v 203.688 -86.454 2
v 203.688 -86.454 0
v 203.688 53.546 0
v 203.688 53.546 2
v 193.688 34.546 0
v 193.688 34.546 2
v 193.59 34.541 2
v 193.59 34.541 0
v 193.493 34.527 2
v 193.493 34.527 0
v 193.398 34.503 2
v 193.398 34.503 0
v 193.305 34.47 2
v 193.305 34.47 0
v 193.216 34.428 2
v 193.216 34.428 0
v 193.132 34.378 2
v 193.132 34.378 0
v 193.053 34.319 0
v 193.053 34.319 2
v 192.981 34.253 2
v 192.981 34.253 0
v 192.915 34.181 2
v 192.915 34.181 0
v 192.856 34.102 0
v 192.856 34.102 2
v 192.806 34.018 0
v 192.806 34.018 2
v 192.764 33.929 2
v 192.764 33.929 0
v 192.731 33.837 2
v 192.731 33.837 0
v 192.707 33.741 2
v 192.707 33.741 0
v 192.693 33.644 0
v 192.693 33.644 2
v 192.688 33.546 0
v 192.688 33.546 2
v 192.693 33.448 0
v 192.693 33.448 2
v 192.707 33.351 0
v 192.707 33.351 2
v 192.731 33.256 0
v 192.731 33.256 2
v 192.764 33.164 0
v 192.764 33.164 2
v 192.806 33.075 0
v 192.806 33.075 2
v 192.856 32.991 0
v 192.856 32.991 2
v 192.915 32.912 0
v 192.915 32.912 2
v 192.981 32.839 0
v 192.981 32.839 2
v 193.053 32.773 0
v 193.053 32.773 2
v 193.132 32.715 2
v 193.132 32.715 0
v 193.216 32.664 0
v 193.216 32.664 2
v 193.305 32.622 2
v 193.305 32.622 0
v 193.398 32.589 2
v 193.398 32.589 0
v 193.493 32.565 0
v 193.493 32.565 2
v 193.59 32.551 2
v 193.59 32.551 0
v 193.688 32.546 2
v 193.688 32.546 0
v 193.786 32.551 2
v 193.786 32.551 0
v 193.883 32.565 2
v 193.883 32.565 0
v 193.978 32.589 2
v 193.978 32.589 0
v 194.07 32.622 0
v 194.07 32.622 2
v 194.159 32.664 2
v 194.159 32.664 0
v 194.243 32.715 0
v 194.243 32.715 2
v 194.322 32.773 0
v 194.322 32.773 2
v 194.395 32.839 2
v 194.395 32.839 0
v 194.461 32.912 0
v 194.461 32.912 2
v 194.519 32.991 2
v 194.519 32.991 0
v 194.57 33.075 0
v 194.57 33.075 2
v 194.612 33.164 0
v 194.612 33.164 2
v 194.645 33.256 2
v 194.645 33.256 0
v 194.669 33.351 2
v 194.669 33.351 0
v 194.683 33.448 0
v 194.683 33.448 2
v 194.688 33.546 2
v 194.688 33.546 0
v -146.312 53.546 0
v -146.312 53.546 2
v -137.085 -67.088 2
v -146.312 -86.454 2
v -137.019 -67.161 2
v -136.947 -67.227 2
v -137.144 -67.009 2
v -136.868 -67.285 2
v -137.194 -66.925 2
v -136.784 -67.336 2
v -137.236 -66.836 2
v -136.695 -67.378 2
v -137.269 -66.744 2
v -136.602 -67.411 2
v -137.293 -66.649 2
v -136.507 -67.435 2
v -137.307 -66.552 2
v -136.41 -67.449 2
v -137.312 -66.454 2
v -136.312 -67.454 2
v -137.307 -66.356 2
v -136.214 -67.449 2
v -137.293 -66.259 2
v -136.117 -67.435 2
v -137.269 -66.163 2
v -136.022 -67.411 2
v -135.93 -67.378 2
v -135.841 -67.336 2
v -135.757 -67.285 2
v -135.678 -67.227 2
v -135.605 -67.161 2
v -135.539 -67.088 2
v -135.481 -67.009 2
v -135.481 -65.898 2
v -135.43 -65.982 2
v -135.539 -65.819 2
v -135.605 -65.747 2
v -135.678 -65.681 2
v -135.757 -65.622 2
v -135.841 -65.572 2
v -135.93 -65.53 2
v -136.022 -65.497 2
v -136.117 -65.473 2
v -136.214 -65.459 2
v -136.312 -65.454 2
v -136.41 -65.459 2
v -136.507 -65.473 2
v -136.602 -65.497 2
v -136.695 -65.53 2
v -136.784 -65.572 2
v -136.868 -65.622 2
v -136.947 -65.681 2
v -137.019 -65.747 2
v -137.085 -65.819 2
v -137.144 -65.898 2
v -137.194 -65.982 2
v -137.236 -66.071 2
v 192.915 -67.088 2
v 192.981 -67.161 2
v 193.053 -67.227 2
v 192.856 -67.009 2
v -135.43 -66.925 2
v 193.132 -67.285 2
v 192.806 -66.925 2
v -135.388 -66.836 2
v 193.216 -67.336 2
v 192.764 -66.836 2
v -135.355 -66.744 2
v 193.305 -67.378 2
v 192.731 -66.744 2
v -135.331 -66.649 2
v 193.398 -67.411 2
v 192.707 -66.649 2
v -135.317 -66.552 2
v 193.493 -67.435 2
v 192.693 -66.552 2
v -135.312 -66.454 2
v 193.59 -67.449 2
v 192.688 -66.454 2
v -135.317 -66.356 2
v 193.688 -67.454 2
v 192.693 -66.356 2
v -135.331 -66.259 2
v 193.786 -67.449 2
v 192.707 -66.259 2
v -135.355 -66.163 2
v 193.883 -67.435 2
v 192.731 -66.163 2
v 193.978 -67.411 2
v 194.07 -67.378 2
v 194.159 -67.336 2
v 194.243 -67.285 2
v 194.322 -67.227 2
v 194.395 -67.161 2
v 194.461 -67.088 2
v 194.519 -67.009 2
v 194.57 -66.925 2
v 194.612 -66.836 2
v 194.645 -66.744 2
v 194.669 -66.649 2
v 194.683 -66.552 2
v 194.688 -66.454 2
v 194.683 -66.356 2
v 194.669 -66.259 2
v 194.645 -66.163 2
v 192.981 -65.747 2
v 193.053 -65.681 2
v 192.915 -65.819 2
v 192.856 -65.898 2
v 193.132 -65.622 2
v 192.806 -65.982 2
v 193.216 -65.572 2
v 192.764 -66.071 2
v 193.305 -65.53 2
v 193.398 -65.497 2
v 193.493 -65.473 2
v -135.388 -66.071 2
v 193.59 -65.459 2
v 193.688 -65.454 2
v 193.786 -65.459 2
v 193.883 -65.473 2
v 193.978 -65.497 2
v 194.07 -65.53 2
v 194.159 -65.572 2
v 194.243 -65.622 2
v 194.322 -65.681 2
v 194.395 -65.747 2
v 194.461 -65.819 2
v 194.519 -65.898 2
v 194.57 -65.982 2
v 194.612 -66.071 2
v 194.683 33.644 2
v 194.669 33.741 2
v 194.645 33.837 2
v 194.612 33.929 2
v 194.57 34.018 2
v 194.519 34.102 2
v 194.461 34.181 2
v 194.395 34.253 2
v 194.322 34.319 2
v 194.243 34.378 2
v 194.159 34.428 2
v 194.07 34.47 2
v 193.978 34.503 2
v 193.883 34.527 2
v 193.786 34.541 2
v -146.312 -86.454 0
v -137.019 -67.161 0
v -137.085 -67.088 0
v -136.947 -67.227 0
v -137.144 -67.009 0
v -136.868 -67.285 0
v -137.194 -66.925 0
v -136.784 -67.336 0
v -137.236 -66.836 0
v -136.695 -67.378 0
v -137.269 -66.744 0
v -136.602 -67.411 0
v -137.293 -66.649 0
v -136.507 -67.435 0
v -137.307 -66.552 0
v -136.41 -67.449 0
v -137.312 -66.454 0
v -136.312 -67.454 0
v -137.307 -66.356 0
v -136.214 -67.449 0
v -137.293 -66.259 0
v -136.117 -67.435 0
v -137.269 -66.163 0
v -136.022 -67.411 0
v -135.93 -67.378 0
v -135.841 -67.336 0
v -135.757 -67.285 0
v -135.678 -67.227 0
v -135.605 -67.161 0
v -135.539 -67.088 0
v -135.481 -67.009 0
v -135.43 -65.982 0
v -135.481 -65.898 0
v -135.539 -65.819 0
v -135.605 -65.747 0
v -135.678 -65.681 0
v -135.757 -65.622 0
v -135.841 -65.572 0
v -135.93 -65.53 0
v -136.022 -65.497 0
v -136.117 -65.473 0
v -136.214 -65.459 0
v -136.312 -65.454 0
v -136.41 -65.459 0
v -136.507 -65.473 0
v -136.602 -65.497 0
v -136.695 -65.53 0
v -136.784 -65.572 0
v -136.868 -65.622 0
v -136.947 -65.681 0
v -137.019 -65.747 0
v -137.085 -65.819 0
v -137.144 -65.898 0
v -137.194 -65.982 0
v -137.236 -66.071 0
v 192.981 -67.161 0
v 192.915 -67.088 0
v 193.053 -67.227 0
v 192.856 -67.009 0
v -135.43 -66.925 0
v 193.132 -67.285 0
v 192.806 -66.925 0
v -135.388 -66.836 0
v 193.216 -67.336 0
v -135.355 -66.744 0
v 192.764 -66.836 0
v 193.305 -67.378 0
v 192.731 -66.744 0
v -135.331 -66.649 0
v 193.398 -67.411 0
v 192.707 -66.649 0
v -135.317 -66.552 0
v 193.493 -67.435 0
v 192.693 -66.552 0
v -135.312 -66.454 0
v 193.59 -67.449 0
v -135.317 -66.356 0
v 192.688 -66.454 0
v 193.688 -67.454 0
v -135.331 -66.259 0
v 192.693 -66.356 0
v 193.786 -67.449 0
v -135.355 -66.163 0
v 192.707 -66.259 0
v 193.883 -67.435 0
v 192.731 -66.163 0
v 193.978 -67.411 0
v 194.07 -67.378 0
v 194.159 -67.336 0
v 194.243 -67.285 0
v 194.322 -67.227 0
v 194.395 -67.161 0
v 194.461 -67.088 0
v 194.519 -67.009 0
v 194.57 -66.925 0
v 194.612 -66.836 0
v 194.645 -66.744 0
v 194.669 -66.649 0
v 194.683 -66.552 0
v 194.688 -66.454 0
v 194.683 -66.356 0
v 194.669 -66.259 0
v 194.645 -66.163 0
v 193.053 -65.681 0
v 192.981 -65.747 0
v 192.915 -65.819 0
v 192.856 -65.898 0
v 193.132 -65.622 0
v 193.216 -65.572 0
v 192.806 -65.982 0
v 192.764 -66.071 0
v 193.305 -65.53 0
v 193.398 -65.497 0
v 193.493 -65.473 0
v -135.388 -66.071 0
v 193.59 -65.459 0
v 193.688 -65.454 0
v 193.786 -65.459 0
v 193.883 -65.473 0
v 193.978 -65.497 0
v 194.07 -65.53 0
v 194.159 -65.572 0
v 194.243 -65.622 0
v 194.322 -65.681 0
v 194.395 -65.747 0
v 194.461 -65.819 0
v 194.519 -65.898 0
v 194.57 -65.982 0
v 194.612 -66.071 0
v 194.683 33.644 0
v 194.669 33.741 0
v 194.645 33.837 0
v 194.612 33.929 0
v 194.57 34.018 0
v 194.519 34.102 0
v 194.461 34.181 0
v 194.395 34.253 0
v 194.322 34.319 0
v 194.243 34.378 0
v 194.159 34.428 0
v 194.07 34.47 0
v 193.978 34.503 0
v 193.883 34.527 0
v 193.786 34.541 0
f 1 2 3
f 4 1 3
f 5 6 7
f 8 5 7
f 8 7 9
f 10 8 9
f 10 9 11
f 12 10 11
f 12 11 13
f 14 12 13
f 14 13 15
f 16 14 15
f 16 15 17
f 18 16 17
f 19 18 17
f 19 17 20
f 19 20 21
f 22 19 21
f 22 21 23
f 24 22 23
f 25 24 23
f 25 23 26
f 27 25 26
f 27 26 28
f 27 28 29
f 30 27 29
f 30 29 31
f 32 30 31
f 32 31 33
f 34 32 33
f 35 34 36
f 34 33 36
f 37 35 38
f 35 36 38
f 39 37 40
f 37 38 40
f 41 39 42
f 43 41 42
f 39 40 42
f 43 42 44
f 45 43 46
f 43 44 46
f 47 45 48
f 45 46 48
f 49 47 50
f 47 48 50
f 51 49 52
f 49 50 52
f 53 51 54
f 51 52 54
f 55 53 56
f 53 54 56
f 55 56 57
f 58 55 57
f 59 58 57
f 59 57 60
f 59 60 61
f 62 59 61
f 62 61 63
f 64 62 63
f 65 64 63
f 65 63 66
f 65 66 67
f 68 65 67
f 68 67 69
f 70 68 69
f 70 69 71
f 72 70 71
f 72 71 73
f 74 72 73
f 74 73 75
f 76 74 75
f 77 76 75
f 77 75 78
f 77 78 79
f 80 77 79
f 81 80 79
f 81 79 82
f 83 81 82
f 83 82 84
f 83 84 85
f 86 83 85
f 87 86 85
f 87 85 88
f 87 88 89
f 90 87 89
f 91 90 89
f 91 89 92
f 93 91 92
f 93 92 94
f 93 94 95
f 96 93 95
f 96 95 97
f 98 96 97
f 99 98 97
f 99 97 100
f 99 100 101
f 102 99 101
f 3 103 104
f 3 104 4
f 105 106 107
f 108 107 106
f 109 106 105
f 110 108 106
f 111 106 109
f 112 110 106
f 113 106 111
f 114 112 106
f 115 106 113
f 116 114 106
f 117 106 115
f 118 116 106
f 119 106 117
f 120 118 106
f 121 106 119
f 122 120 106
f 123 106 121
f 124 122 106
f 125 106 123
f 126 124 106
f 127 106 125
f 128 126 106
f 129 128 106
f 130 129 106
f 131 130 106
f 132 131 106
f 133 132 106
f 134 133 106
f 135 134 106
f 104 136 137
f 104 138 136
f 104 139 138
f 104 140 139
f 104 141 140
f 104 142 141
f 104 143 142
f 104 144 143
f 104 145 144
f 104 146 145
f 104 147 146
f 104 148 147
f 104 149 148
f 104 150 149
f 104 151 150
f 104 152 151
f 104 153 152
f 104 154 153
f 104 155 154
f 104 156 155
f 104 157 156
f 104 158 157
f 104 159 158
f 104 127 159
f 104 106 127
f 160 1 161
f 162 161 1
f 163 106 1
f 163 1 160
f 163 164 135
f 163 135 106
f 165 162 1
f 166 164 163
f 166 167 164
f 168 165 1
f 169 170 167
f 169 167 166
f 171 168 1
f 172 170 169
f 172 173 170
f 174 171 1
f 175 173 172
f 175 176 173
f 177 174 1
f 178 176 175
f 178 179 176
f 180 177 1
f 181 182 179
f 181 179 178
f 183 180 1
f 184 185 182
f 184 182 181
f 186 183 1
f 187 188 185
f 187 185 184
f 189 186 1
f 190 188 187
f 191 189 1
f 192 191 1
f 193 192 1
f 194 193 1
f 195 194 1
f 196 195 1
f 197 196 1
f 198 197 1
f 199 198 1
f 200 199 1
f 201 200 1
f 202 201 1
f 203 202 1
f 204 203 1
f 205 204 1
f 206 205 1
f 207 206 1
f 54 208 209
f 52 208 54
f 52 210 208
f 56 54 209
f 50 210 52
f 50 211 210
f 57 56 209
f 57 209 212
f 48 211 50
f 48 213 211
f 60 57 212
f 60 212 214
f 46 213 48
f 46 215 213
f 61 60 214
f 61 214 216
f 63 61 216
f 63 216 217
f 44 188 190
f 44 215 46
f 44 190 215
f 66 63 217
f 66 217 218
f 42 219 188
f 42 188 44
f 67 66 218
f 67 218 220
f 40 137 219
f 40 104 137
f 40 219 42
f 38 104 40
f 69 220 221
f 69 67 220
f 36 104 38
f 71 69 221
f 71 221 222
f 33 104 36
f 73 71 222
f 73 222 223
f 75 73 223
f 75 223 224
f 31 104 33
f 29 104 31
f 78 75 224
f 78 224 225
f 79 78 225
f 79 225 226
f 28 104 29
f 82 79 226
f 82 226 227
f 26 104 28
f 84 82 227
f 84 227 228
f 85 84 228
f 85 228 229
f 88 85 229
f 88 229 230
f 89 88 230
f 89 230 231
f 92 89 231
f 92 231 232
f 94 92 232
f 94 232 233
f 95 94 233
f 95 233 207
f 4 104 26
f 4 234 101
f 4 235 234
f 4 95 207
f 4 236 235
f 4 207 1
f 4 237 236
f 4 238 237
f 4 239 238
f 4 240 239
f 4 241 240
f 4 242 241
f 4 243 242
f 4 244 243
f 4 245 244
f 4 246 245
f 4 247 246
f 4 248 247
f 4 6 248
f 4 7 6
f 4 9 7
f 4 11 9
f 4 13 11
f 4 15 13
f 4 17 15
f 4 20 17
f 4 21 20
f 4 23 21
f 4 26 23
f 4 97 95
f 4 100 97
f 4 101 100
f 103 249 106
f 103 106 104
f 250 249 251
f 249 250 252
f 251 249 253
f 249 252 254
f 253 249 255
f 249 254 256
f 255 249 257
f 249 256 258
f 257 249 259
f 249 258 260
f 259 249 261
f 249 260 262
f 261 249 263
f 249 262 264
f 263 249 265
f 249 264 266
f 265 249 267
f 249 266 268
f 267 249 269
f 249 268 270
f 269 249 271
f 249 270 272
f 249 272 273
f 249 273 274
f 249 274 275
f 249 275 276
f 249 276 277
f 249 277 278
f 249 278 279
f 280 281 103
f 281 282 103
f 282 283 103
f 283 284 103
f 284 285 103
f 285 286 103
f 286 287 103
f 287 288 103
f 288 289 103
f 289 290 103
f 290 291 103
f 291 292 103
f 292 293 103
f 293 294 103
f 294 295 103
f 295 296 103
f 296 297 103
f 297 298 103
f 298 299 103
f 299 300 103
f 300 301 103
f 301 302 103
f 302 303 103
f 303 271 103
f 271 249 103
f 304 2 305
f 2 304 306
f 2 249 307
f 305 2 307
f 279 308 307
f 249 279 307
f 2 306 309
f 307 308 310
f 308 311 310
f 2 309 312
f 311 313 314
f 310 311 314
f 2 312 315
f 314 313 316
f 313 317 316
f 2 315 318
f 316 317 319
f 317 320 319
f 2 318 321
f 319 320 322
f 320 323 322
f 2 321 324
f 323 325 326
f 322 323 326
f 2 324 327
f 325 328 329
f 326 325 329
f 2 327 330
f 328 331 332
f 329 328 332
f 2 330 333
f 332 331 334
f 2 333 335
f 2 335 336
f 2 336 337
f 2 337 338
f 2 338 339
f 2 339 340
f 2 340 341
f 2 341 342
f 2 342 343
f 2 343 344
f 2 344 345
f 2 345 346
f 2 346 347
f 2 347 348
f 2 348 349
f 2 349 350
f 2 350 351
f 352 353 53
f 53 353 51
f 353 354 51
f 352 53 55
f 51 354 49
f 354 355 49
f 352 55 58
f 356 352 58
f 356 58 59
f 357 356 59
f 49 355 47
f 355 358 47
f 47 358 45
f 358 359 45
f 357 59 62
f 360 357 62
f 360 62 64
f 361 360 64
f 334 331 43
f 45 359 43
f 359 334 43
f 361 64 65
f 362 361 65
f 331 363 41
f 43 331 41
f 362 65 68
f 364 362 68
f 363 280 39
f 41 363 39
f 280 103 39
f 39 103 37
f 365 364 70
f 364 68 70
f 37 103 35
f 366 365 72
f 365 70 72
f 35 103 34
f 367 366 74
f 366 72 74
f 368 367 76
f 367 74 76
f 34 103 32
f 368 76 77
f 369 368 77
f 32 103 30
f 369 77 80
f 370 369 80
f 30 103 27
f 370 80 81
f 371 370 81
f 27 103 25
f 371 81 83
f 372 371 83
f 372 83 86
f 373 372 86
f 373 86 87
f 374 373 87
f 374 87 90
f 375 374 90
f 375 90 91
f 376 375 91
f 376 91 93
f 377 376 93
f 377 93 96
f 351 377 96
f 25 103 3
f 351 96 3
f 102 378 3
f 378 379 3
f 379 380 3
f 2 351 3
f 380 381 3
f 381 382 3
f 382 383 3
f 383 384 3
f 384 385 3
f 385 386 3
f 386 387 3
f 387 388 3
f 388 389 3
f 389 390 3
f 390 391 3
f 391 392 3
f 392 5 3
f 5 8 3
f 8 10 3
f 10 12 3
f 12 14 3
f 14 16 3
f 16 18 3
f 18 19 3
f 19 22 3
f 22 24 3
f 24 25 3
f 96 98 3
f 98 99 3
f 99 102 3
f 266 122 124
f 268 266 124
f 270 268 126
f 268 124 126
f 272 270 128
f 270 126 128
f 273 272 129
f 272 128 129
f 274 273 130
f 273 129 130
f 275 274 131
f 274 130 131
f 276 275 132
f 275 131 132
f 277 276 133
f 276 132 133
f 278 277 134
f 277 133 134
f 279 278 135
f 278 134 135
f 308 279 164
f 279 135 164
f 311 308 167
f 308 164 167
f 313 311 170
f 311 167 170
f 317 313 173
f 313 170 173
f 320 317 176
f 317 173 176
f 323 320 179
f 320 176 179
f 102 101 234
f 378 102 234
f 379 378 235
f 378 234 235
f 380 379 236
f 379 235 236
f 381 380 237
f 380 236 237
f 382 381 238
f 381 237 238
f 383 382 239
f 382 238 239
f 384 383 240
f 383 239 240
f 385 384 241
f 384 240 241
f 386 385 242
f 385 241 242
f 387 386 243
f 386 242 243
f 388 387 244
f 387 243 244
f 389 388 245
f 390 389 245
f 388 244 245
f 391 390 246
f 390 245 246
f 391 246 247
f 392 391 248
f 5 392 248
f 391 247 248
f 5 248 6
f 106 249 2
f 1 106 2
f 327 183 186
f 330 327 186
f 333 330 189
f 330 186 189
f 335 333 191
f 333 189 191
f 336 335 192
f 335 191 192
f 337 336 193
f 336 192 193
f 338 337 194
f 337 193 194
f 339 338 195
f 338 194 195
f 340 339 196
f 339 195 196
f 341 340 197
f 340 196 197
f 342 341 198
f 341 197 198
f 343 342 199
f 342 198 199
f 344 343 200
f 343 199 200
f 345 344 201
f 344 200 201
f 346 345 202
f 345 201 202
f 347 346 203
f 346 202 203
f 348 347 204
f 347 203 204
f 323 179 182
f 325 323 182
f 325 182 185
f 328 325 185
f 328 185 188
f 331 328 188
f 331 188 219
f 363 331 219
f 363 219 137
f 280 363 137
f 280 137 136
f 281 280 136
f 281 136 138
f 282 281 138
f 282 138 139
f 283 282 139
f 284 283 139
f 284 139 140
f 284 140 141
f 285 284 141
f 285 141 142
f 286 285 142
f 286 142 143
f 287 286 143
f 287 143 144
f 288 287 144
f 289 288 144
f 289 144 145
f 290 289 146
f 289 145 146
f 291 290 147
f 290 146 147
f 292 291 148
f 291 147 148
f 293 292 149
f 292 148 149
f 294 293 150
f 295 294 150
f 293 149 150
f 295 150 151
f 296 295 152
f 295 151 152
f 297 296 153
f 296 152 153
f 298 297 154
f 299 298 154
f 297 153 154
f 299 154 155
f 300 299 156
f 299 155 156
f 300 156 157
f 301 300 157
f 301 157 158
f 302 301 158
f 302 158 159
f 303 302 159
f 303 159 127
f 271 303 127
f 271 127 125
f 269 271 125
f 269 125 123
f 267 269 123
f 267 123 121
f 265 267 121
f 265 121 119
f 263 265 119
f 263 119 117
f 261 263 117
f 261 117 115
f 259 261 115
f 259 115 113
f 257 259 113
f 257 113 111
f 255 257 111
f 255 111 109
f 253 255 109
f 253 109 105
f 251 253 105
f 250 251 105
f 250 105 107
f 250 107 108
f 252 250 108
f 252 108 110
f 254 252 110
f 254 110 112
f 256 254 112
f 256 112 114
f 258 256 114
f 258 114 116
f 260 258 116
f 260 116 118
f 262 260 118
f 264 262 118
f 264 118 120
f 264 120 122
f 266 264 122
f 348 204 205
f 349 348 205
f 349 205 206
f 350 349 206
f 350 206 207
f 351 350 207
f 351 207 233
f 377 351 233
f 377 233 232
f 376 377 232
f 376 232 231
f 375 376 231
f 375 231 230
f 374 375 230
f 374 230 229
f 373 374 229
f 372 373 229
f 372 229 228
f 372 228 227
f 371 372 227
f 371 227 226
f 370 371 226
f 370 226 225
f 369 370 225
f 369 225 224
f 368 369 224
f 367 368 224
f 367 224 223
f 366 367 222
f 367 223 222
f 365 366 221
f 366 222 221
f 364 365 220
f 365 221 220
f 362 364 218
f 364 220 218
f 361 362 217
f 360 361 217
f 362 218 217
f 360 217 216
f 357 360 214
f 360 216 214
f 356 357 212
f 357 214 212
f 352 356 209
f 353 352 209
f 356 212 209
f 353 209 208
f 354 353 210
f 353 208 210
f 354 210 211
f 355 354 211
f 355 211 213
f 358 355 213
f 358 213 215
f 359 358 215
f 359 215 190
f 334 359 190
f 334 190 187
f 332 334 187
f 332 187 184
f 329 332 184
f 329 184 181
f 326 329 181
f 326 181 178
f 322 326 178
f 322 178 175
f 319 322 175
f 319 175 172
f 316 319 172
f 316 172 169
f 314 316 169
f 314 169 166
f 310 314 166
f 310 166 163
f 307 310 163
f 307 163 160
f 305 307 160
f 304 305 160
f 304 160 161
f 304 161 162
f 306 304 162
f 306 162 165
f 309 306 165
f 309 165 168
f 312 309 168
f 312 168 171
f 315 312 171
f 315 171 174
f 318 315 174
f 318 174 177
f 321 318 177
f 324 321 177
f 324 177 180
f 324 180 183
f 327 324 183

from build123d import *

# Parameters (mm, degrees)
F0_W     = 350
F0_H     = 140
F1_DEPTH = 2
F3_DEPTH = 25
F5_DEPTH = 25
F7_DEPTH = 25


with BuildPart() as f1:
    # F0 (on Top) → F1 (new body)
    with BuildSketch(Plane.XY):
        with Locations((28.687808, -16.453781)):
            Rectangle(F0_W, F0_H)
    extrude(amount=F1_DEPTH)

    # F2 (on face) → F3 (cut)
    with BuildSketch(Plane.XY.offset(2)):
        with BuildLine():
            ThreePointArc((-135.312192, -66.453781), (-137.019299, -65.746674), (-136.312192, -67.453781))
            ThreePointArc((-136.312192, -67.453781), (-135.605085, -67.160887), (-135.312192, -66.453781))
        make_face()
    extrude(amount=-F3_DEPTH, mode=Mode.SUBTRACT)

    # F4 (on face) → F5 (cut)
    with BuildSketch(Plane.XY.offset(2)):
        with BuildLine():
            ThreePointArc((194.687808, 33.546219), (194.394915, 34.253326), (193.687808, 34.546219))
            ThreePointArc((193.687808, 34.546219), (192.980701, 32.839113), (194.687808, 33.546219))
        make_face()
    extrude(amount=-F5_DEPTH, mode=Mode.SUBTRACT)

    # F6 (on face) → F7 (cut)
    with BuildSketch(Plane.XY.offset(2)):
        with BuildLine():
            ThreePointArc((194.687808, -66.453781), (192.980701, -65.746674), (193.687808, -67.453781))
            ThreePointArc((193.687808, -67.453781), (194.394915, -67.160887), (194.687808, -66.453781))
        make_face()
    extrude(amount=-F7_DEPTH, mode=Mode.SUBTRACT)


solid = f1.part
